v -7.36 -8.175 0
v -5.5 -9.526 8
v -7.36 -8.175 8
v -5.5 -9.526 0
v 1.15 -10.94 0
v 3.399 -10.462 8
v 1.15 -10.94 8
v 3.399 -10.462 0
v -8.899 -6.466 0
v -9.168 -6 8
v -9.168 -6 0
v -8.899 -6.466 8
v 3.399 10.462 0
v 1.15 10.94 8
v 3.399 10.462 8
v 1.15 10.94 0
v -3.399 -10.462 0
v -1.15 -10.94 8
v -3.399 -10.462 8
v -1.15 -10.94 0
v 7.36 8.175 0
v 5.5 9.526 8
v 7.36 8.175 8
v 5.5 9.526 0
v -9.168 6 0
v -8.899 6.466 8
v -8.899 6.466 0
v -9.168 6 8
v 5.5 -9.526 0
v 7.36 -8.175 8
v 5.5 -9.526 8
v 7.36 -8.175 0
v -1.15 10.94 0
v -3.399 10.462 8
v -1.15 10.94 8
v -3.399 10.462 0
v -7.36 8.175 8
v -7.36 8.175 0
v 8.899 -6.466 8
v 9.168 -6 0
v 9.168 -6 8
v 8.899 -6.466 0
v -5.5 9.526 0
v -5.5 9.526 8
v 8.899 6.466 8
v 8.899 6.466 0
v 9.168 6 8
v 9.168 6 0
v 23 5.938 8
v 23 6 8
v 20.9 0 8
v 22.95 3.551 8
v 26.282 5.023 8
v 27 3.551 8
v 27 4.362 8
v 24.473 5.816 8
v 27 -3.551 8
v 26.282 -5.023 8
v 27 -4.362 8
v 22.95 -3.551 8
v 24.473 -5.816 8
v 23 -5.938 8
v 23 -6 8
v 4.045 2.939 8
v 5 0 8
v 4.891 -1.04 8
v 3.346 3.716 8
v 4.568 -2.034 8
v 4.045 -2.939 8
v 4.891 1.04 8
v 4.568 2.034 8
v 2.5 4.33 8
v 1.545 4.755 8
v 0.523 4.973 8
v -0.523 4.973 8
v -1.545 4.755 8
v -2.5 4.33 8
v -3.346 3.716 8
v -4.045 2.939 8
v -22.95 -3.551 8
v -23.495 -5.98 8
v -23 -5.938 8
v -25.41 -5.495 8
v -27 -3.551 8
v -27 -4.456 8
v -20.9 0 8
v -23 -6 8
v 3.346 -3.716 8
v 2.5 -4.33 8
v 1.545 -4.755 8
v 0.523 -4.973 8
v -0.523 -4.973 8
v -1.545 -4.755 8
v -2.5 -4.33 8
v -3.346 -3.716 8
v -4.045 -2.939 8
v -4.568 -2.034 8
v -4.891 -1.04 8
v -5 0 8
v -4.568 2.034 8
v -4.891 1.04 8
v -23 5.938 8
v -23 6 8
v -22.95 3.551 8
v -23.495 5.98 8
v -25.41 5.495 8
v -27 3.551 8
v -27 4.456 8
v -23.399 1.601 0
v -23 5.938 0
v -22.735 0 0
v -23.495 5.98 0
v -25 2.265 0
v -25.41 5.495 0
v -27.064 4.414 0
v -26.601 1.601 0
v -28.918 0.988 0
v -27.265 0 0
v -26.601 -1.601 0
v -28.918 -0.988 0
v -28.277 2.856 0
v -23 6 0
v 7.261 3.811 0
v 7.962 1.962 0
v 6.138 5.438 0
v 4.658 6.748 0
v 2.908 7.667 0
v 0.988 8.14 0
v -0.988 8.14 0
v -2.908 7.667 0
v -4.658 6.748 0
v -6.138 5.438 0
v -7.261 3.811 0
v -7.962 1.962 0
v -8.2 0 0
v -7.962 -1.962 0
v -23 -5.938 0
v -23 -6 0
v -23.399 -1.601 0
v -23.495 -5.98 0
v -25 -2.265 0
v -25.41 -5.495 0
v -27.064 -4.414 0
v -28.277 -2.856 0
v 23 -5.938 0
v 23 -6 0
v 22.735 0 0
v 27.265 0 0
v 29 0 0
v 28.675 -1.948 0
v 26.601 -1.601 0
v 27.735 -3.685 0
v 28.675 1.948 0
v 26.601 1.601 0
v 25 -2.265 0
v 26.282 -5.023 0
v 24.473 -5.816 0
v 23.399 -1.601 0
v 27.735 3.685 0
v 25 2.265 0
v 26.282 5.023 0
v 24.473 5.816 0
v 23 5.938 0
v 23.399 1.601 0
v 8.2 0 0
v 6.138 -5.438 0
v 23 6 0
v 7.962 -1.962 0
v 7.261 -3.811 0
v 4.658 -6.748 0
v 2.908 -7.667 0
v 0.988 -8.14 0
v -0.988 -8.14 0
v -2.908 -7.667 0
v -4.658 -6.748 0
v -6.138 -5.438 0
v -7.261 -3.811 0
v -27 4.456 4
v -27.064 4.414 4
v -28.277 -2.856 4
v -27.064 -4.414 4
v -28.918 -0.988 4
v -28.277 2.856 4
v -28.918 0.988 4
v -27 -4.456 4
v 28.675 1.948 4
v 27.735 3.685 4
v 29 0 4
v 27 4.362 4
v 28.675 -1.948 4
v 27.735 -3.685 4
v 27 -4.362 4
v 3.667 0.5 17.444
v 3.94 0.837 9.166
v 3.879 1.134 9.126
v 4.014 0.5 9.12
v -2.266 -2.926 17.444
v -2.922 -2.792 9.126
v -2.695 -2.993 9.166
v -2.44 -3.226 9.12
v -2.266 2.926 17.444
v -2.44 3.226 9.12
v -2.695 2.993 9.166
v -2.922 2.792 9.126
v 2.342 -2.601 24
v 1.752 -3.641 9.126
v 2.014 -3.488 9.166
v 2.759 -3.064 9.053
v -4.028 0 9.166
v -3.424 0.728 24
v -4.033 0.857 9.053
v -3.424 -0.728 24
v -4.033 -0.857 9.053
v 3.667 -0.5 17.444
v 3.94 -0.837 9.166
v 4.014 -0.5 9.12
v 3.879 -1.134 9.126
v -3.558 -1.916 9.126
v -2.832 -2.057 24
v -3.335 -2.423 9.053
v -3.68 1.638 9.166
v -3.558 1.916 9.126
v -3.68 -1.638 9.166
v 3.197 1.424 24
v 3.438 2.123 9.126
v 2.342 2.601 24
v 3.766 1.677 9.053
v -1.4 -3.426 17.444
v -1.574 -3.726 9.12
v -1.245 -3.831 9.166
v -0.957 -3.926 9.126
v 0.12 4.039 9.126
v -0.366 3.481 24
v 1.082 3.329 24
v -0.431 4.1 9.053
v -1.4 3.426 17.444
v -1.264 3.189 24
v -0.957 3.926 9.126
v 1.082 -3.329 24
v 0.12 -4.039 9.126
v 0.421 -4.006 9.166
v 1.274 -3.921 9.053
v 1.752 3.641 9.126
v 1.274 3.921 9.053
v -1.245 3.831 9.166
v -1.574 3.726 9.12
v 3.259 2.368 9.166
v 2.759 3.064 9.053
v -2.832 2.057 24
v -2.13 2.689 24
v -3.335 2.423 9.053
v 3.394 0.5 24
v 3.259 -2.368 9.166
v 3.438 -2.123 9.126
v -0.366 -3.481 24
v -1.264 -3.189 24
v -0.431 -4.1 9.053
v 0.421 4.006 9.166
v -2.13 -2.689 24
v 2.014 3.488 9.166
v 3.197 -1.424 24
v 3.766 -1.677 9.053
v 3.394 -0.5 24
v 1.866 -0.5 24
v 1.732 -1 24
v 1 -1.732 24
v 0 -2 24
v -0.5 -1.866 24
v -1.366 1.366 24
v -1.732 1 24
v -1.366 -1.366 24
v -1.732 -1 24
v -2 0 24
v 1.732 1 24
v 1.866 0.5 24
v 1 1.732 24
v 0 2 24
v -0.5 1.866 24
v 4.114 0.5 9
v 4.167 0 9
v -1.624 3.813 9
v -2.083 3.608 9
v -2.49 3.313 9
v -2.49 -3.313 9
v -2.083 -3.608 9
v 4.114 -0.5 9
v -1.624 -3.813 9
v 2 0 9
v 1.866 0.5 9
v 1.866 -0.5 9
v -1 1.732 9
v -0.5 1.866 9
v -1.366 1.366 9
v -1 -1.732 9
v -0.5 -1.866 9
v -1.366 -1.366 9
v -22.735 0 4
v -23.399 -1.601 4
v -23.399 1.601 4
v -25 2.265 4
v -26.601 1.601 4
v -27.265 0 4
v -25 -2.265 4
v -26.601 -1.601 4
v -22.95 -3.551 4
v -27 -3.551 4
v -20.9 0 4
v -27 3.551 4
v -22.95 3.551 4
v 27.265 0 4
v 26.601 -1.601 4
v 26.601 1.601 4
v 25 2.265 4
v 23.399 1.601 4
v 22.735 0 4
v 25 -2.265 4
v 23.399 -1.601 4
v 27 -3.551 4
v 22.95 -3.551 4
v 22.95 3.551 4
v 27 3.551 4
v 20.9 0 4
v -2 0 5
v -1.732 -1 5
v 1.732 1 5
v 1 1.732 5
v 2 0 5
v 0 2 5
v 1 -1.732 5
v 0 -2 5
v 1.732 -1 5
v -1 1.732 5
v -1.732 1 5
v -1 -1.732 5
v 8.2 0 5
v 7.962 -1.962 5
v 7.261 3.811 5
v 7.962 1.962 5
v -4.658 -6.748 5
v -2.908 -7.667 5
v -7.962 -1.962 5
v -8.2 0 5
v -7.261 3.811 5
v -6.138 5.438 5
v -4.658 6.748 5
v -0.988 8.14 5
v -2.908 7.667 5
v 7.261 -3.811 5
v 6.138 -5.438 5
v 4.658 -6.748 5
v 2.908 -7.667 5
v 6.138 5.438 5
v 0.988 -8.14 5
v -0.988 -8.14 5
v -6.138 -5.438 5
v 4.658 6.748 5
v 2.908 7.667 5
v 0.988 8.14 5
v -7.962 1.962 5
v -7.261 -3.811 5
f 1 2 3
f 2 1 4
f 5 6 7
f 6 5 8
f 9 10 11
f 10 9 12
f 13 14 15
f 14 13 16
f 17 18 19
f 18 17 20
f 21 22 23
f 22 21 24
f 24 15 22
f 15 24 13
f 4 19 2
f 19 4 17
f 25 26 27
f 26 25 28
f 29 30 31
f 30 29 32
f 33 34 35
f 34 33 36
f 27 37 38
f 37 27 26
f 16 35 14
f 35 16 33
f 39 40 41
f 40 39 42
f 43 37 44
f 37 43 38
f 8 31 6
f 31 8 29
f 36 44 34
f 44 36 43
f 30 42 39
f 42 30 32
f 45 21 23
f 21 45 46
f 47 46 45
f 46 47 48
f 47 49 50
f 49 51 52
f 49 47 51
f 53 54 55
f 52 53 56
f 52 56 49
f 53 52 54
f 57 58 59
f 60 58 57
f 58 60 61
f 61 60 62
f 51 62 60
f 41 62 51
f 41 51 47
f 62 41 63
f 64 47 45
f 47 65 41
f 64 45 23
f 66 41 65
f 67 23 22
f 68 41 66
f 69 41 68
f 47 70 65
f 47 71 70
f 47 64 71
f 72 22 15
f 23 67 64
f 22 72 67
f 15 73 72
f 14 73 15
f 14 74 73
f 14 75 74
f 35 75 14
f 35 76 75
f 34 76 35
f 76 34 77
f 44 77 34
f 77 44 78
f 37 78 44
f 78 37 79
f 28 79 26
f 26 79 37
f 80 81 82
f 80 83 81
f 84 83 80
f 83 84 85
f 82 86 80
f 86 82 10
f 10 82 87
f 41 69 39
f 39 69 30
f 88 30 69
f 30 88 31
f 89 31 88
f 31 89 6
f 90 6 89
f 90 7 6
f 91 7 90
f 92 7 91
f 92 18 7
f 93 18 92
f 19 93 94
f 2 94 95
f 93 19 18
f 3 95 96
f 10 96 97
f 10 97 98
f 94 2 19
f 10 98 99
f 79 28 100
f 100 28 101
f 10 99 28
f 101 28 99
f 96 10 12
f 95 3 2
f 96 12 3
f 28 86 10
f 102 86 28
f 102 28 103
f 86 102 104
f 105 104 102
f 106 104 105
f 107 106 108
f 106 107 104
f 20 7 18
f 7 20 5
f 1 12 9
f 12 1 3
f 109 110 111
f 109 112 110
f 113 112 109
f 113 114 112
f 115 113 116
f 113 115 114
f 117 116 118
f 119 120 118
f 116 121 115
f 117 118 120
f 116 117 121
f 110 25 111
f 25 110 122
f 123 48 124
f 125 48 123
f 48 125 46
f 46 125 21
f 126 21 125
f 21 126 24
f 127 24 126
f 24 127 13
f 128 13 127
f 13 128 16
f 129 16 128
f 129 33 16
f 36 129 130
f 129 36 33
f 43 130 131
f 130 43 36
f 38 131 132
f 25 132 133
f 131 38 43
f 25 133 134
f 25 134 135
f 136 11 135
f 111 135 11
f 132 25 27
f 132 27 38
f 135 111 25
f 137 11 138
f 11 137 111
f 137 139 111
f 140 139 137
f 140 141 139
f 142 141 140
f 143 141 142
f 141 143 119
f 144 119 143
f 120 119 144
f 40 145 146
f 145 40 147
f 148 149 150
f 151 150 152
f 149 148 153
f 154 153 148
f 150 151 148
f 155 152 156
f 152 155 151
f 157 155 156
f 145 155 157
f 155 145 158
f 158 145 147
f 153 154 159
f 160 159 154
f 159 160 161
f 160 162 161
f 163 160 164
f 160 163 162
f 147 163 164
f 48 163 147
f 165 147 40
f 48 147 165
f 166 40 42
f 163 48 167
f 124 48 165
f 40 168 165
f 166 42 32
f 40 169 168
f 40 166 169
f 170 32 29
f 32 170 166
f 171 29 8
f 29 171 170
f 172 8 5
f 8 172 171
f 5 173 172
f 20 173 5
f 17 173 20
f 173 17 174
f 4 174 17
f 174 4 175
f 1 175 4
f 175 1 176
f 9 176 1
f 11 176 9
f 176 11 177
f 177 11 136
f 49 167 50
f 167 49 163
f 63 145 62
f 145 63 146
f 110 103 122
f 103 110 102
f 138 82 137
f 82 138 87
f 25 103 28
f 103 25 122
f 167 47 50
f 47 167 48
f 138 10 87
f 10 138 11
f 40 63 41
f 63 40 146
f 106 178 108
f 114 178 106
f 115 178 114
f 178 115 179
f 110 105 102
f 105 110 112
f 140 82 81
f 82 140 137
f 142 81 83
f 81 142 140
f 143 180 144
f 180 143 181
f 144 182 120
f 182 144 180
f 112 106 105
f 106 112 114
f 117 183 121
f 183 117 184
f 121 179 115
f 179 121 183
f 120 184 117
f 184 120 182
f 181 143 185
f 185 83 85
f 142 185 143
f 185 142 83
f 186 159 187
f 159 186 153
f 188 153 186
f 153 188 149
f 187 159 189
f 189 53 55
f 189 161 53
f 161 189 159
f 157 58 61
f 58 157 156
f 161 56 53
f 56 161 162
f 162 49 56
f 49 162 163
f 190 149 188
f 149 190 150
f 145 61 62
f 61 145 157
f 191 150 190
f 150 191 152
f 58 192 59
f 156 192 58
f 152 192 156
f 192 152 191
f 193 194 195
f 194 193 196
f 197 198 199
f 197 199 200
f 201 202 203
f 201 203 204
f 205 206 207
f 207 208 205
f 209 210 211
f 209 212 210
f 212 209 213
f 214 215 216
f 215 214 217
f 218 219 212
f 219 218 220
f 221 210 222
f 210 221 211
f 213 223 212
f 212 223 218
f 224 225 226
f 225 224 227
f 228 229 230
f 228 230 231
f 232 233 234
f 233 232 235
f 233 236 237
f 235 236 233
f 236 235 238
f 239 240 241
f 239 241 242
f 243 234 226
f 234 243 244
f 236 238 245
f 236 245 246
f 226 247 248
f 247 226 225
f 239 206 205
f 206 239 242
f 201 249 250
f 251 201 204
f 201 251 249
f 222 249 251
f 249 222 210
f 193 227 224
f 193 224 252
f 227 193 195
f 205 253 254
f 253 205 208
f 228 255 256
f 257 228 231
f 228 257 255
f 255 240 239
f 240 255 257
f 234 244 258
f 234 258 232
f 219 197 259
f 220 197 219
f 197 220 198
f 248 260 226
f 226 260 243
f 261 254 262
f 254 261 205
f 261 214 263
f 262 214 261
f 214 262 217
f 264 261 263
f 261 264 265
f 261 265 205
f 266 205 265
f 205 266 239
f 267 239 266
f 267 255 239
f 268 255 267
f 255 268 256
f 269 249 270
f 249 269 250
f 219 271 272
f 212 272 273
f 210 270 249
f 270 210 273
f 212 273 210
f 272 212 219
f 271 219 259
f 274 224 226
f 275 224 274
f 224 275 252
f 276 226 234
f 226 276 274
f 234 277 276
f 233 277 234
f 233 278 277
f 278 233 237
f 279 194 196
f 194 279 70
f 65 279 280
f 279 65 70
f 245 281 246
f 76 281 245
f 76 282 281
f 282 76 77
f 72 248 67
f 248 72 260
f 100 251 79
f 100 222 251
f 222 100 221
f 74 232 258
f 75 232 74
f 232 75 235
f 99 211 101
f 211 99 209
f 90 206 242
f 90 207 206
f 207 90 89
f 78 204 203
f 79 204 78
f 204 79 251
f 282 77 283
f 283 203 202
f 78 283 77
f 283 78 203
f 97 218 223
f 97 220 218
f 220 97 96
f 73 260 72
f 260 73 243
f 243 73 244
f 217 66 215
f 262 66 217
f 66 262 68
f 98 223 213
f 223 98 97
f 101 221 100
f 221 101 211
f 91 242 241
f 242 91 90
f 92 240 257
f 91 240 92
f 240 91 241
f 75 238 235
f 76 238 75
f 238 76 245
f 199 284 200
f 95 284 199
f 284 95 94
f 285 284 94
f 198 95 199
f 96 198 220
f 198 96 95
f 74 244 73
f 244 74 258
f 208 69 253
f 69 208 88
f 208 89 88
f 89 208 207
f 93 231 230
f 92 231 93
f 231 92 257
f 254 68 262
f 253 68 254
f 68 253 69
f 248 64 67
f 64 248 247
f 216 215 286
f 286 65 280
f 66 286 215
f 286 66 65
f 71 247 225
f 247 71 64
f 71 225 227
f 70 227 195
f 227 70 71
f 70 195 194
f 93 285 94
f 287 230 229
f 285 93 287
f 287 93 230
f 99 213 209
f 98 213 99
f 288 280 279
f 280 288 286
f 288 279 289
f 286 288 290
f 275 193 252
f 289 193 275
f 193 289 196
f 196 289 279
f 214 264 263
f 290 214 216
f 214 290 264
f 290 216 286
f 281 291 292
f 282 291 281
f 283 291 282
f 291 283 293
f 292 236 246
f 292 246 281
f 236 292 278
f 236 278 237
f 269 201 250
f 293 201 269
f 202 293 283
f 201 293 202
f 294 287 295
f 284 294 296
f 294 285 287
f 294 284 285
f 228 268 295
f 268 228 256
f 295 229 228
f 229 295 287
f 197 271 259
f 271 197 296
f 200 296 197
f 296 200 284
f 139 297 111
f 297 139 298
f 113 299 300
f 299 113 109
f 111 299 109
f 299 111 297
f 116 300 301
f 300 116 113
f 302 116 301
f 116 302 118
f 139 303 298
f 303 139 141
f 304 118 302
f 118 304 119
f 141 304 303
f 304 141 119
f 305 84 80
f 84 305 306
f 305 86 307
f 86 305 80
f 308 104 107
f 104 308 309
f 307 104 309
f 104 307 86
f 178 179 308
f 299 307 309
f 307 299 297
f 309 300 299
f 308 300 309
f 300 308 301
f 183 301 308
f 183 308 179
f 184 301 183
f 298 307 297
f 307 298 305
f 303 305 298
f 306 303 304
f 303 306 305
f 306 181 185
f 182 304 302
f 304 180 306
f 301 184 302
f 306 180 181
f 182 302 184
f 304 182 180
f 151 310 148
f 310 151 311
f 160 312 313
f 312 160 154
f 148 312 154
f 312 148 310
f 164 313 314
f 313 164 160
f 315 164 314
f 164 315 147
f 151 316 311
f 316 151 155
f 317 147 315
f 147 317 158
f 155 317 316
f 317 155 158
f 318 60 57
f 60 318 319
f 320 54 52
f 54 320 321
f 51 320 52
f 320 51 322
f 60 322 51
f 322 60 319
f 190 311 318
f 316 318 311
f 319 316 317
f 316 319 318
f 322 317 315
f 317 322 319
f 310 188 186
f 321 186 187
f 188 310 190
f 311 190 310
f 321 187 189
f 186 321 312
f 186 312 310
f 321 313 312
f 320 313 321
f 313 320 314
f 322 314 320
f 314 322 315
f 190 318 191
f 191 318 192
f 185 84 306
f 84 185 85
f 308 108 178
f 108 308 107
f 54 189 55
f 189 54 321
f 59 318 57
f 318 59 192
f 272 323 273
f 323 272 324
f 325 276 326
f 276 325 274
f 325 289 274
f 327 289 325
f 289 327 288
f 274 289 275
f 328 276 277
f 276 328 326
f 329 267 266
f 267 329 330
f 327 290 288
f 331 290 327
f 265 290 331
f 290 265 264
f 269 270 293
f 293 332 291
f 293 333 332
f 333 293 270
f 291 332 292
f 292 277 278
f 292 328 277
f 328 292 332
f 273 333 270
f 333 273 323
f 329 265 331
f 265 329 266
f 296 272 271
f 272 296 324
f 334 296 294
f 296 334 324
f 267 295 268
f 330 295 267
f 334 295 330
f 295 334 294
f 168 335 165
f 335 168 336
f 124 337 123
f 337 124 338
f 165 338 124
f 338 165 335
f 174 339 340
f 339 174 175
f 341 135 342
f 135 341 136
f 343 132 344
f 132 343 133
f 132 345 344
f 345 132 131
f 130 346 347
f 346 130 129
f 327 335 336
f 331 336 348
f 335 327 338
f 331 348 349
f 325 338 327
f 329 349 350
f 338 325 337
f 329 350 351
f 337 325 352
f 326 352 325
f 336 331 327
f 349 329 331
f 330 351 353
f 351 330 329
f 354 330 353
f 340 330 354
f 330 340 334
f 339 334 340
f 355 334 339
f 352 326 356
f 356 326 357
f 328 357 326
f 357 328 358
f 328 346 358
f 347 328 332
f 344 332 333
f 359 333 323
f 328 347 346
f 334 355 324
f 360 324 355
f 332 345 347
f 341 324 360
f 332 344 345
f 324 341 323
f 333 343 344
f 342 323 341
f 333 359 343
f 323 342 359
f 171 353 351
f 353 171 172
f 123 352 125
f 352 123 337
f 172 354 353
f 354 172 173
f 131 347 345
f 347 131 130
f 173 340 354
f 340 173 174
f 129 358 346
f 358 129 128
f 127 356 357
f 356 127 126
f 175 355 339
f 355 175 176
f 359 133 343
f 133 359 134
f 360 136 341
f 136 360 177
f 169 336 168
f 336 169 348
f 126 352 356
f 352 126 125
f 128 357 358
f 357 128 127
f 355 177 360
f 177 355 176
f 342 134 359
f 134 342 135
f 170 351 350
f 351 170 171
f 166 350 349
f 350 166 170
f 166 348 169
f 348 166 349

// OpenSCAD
// file: polyholes.scad
//
// Mendel90
//
// GNU GPL v2
// nop.head@gmail.com
// hydraraptor.blogspot.com
//
// See http://hydraraptor.blogspot.com/2011/02/polyholes.html
//
function sides(r) = max(round(4 *r),3);
function corrected_radius(r,n) = 0.1 + r / cos(180 / n);
function corrected_diameter(d) = 0.2 + d / cos(180 / sides(d / 2));

module poly_circle(r, center = false) {
    n = sides(r);
    circle(r = corrected_radius(r,n), $fn = n, center = center);
}

module poly_cylinder(r, h, center = false) {
    n = sides(r);
    cylinder(h = h, r = corrected_radius(r,n), $fn = n, center = center);
}

module poly_d_cylinder(r, center = false) {
    n = sides(r);
    r = corrected_radius(r,n);
    cylinder(h = h, r = r, $fn = n, center = center);
    translate([0, -r, 0])
        cube([r, 2 * r, h]);
}
// main file
use <polyholes.scad>

module clamp(h, base){
  difference(){
    union() {
      // Clamp cone for M8 nut.
      cylinder(r1=4.5, r2=3.5, h=h);
      // Gradual cone base.
      translate([0, 0, base]) cylinder(r1=10, r2=0, h=12, center=true);
      // Base middle.
      translate([0, 0, base/2]) {
	cylinder(r=11, h=base, center=true);
	cube([46, 12, base], center=true);
      }
      // Shoulders around screw holes.
      for (x = [-23, 23]) {
	translate([x, 0, base/2]) cylinder(r=6, h=base, center=true);
      }
    }
    // Bowden cable through hole.
    cylinder(r=2, h=30, $fn=12);
    // Three sided cutout.
    for (a = [0:120:359]) {
      rotate([0, 0, a]) translate([3, 0, base+1+h/2])
	cube([5, 1, h], center=true);
    }
    // Holder for PEEK insulator (e.g. MakerGear GrooveMount).
    cylinder(r=8.2, h=10, center=true);
    // Nut traps and screw holes.
    for (x = [-25, 25]) {
      translate([x, 0, base/2]) {
	poly_cylinder(r = 2, h=base+1, center=true, $fn=12);
	rotate([0, 0, 0]) cylinder(r=4.1, h=base, $fn=6);
      }
      translate([x*1.2, 0, base]) cube([6, 20, base], center=true);
    }
  }
}

height = 24;
clamp(height, 8);

// Increase cooling time per layer for the thin riser.
//translate([0, -20, height/2]) cube([60, 3, height], center=true);
